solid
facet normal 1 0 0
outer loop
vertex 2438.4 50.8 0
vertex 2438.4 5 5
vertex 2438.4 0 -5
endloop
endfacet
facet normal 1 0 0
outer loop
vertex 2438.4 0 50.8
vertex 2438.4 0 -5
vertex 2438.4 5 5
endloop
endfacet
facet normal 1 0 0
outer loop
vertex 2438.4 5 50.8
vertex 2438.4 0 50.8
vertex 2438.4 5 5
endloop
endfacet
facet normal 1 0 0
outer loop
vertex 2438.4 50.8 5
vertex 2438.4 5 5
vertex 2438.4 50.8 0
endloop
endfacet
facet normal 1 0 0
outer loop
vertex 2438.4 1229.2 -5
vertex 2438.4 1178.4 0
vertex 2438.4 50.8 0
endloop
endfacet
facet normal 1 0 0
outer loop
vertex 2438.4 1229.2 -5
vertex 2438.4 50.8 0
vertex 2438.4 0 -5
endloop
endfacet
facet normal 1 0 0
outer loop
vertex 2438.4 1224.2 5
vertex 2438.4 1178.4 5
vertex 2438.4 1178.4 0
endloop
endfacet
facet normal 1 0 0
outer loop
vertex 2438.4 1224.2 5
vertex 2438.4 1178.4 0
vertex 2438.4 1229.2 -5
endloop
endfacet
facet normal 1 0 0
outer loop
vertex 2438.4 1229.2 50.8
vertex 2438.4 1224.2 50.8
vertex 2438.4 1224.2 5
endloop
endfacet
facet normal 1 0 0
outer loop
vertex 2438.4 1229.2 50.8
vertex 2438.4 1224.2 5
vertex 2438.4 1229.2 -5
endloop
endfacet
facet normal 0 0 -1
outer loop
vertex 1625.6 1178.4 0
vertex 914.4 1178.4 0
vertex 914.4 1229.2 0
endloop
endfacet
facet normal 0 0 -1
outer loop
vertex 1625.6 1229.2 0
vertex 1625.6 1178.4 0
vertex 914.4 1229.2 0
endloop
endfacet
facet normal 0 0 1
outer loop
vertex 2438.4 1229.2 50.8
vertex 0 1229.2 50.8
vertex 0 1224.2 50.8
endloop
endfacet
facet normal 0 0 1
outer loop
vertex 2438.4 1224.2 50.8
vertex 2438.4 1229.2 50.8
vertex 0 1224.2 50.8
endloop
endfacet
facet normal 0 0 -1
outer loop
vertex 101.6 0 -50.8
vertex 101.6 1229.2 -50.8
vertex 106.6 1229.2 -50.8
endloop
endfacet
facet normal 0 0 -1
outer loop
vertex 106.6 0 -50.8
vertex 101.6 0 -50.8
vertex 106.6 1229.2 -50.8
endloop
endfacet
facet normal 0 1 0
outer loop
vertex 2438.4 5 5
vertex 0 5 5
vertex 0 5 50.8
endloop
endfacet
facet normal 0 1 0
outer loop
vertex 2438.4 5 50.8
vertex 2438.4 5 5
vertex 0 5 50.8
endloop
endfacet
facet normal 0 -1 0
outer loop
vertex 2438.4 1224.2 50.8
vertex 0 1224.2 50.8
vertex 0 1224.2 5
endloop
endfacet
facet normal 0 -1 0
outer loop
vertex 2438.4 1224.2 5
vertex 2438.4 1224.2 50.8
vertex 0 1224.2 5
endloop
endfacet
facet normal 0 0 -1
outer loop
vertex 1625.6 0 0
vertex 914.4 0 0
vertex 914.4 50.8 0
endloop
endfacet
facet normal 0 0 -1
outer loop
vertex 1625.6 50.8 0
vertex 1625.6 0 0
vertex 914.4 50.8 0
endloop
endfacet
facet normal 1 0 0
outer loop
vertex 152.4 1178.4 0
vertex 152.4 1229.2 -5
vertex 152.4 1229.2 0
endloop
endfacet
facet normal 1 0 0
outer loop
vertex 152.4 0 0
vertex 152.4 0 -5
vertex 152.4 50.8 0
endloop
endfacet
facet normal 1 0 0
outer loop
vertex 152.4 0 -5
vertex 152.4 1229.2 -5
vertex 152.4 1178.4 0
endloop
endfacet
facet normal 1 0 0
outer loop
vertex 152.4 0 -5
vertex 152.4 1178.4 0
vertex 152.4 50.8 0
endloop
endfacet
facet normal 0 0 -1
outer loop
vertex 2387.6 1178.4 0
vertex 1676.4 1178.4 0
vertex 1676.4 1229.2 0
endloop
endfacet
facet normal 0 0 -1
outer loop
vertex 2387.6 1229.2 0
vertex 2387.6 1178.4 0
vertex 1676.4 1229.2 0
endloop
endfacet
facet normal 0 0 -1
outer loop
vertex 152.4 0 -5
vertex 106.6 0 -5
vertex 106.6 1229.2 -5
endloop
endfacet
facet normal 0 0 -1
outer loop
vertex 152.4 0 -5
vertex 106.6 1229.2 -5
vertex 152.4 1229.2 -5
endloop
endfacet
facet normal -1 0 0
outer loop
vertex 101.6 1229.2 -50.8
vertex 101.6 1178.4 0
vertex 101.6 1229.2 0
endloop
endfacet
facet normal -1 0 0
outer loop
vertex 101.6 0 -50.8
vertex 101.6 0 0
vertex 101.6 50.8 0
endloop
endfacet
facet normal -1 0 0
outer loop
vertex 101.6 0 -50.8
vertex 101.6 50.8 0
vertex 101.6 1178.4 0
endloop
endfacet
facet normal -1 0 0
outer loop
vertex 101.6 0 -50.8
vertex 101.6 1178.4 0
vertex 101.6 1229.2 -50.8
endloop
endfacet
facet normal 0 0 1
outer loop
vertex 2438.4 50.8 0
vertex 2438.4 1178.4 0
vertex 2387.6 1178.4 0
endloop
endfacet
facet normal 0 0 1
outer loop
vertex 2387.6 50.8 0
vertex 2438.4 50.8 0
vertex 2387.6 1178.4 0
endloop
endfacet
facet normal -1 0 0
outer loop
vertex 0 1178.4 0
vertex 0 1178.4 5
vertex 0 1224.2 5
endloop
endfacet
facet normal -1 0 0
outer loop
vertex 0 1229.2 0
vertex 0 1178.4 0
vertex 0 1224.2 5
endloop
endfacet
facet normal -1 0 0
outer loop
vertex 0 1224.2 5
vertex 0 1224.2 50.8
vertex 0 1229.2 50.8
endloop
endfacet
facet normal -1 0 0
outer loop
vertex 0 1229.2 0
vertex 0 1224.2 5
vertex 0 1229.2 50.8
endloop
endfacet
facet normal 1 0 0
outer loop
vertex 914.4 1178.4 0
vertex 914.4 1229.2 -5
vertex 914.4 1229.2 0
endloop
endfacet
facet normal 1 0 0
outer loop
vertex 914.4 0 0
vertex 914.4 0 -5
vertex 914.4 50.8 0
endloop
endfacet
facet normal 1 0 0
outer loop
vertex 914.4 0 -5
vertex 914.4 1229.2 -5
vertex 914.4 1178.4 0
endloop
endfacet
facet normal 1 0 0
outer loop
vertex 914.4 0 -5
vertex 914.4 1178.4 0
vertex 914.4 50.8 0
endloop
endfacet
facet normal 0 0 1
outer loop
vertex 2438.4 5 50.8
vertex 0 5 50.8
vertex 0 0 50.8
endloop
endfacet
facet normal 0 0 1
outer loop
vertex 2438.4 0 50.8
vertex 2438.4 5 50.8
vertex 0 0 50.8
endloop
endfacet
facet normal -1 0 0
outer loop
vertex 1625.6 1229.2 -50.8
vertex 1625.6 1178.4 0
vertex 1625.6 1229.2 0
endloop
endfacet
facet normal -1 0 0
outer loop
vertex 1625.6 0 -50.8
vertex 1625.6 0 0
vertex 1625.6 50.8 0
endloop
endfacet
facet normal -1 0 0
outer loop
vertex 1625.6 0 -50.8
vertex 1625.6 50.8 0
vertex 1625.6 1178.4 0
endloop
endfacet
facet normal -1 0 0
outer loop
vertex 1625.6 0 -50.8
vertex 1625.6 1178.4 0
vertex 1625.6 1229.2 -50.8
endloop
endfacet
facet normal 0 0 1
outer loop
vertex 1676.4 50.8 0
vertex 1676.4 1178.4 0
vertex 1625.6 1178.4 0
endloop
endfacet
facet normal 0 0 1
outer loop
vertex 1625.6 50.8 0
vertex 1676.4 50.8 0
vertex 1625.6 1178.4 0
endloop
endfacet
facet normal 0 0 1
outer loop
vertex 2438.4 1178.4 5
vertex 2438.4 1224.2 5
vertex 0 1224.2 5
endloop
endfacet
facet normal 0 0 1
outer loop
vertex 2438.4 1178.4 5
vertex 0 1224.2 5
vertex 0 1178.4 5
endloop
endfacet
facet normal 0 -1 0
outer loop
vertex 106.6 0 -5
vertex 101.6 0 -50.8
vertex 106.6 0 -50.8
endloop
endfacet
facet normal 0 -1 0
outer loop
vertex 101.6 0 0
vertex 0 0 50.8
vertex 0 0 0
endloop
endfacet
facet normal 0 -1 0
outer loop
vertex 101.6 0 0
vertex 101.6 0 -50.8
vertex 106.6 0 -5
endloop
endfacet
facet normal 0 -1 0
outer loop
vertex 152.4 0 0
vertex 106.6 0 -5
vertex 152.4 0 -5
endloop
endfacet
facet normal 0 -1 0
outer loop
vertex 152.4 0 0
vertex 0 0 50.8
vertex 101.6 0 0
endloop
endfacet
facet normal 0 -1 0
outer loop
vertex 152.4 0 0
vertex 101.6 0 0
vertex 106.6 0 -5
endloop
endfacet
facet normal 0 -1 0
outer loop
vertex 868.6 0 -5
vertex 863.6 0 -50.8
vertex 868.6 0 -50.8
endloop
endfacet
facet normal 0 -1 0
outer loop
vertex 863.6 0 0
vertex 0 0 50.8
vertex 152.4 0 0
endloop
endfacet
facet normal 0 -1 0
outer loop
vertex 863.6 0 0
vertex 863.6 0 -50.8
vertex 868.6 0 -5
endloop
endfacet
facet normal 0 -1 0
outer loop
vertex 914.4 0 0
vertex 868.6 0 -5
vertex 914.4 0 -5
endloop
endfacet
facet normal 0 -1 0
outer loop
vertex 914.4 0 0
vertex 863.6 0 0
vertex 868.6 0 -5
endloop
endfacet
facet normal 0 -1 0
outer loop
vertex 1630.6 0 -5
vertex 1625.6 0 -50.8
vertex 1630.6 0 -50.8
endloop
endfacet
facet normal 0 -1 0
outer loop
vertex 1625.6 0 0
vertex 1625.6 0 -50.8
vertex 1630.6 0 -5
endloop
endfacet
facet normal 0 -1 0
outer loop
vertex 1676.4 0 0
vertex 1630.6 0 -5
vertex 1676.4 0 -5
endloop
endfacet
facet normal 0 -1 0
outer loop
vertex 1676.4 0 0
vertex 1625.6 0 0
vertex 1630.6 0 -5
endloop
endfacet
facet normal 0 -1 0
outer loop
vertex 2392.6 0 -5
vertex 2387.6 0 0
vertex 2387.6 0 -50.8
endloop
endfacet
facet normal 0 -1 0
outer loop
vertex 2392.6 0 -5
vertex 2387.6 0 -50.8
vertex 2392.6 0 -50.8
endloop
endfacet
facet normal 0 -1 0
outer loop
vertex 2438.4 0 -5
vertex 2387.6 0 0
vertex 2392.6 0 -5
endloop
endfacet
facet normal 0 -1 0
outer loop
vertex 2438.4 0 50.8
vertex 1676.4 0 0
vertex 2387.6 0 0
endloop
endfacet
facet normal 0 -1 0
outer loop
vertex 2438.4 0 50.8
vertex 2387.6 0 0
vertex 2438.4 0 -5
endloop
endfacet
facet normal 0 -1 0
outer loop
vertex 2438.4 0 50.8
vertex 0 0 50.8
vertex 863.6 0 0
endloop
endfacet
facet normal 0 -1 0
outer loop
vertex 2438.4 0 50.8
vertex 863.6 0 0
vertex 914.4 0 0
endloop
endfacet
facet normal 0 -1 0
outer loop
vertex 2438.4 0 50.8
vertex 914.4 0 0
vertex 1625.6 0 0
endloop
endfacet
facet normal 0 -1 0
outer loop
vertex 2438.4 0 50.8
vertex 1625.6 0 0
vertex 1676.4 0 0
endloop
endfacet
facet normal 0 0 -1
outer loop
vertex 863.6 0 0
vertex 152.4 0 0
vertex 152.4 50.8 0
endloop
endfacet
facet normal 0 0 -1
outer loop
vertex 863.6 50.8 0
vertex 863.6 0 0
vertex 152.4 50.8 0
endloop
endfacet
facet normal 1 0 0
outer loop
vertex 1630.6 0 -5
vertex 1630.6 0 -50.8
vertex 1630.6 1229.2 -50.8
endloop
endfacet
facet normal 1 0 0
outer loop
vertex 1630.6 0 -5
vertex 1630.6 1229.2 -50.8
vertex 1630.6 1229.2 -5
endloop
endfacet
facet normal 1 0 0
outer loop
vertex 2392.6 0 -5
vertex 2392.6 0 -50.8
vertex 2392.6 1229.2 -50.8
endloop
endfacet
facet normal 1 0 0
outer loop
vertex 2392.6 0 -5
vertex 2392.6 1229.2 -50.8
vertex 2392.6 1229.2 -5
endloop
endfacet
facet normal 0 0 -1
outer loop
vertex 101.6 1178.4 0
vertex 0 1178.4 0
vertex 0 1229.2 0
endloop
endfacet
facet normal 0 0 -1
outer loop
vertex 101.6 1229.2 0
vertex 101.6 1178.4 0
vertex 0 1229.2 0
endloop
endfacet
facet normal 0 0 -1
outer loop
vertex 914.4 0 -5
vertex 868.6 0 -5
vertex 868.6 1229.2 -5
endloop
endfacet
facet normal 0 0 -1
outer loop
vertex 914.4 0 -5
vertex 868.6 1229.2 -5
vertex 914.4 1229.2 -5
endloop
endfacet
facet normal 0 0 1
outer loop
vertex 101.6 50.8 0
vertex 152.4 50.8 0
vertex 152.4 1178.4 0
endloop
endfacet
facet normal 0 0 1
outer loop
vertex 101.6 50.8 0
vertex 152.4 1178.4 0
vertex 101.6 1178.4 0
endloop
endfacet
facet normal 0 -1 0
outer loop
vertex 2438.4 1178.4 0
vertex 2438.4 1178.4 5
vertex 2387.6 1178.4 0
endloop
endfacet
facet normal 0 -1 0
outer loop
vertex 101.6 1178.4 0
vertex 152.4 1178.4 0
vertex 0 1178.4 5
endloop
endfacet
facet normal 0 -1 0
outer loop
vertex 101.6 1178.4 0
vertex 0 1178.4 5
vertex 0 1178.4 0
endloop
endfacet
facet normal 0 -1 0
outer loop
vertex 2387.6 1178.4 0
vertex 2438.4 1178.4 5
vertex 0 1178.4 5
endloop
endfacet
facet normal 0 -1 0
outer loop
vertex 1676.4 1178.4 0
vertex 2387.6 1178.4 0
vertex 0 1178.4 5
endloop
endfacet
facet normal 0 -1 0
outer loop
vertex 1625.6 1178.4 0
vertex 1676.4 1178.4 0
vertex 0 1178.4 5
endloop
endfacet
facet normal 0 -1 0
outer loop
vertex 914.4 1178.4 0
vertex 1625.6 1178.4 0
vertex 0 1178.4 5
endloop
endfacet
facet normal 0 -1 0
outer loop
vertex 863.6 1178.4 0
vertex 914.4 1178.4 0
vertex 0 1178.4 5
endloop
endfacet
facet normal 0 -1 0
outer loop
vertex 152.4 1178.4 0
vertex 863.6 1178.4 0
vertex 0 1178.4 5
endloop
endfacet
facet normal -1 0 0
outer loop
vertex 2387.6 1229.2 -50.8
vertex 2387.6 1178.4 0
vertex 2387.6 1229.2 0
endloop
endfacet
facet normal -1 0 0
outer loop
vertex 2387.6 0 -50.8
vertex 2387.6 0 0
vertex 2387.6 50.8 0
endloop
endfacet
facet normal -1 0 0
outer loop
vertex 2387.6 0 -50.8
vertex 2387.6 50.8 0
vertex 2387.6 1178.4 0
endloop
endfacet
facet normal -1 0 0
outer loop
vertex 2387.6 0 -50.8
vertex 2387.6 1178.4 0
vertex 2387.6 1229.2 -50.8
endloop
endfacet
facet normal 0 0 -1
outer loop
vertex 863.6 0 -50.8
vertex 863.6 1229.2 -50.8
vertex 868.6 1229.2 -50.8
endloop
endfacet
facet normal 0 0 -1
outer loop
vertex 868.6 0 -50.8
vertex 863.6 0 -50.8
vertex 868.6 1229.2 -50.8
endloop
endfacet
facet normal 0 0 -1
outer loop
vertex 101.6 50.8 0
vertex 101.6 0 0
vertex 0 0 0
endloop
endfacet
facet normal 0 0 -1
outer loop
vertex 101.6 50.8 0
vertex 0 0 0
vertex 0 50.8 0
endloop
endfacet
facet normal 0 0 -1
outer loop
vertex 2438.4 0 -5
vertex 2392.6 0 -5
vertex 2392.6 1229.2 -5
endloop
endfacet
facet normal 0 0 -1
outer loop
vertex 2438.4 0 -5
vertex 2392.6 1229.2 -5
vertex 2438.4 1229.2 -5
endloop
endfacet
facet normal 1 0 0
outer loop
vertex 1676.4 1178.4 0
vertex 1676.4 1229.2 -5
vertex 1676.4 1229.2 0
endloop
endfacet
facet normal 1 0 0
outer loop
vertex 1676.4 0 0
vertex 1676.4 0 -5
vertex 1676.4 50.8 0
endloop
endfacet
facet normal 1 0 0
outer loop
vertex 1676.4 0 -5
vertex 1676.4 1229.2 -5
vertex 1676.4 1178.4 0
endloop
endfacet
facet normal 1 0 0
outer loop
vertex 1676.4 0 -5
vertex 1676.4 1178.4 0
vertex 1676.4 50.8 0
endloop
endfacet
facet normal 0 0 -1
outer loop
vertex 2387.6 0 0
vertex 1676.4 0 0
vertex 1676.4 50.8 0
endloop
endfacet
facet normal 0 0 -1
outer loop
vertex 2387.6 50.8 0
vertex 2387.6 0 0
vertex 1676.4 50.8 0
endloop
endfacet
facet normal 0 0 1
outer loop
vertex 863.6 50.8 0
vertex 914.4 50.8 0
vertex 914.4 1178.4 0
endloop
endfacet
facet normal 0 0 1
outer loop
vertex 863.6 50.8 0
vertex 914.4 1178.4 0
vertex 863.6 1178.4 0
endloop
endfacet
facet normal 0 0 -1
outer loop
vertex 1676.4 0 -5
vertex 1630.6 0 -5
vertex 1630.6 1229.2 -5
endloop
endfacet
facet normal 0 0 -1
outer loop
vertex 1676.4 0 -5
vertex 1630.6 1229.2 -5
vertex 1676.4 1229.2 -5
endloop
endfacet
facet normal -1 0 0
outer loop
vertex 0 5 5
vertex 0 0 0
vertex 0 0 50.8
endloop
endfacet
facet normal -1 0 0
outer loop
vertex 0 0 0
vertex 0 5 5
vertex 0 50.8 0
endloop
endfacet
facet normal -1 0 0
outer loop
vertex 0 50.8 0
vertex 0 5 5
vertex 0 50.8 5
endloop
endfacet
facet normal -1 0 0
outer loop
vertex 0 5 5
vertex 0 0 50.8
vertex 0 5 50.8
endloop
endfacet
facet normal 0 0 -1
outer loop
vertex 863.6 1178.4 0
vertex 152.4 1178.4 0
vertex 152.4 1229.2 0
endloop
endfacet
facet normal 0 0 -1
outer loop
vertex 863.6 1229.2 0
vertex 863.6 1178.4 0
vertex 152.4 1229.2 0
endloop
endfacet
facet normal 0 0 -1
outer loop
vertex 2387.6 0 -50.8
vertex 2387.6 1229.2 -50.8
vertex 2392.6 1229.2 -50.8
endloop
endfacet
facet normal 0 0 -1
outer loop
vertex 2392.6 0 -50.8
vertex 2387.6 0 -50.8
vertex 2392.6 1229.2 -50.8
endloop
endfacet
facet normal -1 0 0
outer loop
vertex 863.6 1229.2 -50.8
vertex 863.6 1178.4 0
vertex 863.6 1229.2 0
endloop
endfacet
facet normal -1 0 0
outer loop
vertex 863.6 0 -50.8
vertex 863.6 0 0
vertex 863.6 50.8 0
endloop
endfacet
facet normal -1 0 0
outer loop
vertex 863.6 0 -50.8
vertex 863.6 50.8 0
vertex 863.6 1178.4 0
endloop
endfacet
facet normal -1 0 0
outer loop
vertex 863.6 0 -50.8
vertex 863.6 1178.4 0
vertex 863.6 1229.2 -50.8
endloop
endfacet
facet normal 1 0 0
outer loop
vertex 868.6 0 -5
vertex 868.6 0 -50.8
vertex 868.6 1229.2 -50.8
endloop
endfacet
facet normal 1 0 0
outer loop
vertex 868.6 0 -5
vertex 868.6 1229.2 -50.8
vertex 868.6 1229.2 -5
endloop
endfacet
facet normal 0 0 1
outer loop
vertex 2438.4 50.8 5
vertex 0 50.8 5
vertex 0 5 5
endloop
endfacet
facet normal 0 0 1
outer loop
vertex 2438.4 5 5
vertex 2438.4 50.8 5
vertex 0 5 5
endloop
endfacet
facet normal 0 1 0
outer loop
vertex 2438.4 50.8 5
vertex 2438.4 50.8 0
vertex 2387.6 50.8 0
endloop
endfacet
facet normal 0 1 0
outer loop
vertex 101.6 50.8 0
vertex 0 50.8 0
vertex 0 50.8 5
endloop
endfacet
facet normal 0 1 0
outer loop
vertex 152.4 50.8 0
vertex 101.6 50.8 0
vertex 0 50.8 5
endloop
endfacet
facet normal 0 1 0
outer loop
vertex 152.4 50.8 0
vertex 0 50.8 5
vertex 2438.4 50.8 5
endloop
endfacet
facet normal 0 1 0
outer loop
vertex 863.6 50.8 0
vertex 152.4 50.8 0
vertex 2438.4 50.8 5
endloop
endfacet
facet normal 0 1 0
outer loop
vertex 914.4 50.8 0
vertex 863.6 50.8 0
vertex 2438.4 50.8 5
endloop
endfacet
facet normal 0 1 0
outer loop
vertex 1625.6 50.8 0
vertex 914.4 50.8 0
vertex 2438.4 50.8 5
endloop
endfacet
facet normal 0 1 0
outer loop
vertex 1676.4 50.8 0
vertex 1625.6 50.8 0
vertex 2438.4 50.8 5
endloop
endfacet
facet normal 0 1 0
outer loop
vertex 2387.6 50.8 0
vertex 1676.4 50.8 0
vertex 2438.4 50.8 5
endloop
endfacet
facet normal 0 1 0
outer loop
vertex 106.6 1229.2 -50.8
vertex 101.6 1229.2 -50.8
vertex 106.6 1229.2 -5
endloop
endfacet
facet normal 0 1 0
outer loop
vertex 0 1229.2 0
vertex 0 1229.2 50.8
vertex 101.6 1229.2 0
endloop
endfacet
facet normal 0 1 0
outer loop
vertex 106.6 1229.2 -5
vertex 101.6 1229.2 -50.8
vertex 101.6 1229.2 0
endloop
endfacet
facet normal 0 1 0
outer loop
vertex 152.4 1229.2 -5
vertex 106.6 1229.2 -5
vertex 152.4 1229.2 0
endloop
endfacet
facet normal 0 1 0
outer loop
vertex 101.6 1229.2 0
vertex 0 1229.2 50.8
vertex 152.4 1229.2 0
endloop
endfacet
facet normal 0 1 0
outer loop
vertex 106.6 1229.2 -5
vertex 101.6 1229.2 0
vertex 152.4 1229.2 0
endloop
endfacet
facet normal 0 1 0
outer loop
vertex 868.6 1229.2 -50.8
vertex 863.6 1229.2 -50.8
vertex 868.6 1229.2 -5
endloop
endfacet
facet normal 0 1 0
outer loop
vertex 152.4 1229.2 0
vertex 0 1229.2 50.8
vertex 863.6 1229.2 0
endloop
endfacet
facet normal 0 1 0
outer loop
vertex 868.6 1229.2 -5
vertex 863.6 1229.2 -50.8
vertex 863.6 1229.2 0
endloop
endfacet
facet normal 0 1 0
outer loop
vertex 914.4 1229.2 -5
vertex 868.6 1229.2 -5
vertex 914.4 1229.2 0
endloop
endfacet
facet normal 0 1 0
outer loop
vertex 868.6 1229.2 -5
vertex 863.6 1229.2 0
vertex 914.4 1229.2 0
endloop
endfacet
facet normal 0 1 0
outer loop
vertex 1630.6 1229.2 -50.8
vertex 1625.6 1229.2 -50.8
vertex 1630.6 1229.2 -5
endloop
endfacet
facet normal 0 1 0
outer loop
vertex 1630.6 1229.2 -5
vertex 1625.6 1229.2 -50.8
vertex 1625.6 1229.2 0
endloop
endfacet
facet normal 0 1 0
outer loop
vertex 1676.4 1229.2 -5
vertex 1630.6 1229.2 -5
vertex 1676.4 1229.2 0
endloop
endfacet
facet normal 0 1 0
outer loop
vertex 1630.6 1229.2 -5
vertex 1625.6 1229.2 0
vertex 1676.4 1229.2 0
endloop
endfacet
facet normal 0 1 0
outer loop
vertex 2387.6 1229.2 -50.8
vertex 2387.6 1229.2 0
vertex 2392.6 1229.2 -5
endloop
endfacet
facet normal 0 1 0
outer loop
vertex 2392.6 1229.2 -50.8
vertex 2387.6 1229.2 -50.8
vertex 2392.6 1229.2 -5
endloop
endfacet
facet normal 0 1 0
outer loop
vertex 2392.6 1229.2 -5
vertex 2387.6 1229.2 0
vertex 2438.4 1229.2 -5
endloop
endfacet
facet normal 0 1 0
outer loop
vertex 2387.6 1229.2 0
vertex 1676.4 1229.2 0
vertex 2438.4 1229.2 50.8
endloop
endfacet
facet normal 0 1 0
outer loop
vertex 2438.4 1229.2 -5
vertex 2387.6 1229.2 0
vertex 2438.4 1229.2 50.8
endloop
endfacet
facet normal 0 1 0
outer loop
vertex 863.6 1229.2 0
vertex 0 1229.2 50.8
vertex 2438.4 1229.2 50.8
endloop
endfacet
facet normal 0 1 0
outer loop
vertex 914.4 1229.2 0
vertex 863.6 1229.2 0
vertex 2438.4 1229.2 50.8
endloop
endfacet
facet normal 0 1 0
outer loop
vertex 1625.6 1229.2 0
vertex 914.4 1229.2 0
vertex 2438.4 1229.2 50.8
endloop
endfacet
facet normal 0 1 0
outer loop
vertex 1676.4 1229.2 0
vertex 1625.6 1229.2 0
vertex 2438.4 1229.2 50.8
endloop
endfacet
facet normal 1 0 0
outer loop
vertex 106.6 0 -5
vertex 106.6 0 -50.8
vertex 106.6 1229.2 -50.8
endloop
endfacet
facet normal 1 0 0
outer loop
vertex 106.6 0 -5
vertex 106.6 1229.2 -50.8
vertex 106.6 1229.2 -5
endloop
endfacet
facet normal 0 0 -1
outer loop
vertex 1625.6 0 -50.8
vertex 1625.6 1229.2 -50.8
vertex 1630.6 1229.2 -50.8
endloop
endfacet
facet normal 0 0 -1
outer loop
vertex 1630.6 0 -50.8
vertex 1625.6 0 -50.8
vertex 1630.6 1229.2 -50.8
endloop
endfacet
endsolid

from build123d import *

# Parameters (mm, degrees)
F1_DEPTH = 2438.4
F3_DEPTH = 1229.2


with BuildPart() as f1:
    # F0 (on Right) → F1 (new body)
    with BuildSketch(Plane.YZ):
        Polygon((0, 50.8), (0, 0), (50.8, 0), (50.8, 5), (5, 5), (5, 50.8), align=None)
        Polygon((1229.2, 0), (1229.2, 50.8), (1224.2, 50.8), (1224.2, 5), (1178.4, 5), (1178.4, 0), align=None)
    extrude(amount=F1_DEPTH)

    # F2 (on Front) → F3 (join, through all)
    with BuildSketch(Plane.XZ):
        Polygon((152.4, 0), (101.6, 0), (101.6, -50.8), (106.6, -50.8), (106.6, -5), (152.4, -5), align=None)
        Polygon((868.6, -50.8), (868.6, -5), (914.4, -5), (914.4, 0), (863.6, 0), (863.6, -50.8), align=None)
        Polygon((1630.6, -50.8), (1630.6, -5), (1676.4, -5), (1676.4, 0), (1625.6, 0), (1625.6, -50.8), align=None)
        Polygon((2392.6, -50.8), (2392.6, -5), (2438.4, -5), (2438.4, 0), (2387.6, 0), (2387.6, -50.8), align=None)
    extrude(amount=-F3_DEPTH)


solid = f1.part
